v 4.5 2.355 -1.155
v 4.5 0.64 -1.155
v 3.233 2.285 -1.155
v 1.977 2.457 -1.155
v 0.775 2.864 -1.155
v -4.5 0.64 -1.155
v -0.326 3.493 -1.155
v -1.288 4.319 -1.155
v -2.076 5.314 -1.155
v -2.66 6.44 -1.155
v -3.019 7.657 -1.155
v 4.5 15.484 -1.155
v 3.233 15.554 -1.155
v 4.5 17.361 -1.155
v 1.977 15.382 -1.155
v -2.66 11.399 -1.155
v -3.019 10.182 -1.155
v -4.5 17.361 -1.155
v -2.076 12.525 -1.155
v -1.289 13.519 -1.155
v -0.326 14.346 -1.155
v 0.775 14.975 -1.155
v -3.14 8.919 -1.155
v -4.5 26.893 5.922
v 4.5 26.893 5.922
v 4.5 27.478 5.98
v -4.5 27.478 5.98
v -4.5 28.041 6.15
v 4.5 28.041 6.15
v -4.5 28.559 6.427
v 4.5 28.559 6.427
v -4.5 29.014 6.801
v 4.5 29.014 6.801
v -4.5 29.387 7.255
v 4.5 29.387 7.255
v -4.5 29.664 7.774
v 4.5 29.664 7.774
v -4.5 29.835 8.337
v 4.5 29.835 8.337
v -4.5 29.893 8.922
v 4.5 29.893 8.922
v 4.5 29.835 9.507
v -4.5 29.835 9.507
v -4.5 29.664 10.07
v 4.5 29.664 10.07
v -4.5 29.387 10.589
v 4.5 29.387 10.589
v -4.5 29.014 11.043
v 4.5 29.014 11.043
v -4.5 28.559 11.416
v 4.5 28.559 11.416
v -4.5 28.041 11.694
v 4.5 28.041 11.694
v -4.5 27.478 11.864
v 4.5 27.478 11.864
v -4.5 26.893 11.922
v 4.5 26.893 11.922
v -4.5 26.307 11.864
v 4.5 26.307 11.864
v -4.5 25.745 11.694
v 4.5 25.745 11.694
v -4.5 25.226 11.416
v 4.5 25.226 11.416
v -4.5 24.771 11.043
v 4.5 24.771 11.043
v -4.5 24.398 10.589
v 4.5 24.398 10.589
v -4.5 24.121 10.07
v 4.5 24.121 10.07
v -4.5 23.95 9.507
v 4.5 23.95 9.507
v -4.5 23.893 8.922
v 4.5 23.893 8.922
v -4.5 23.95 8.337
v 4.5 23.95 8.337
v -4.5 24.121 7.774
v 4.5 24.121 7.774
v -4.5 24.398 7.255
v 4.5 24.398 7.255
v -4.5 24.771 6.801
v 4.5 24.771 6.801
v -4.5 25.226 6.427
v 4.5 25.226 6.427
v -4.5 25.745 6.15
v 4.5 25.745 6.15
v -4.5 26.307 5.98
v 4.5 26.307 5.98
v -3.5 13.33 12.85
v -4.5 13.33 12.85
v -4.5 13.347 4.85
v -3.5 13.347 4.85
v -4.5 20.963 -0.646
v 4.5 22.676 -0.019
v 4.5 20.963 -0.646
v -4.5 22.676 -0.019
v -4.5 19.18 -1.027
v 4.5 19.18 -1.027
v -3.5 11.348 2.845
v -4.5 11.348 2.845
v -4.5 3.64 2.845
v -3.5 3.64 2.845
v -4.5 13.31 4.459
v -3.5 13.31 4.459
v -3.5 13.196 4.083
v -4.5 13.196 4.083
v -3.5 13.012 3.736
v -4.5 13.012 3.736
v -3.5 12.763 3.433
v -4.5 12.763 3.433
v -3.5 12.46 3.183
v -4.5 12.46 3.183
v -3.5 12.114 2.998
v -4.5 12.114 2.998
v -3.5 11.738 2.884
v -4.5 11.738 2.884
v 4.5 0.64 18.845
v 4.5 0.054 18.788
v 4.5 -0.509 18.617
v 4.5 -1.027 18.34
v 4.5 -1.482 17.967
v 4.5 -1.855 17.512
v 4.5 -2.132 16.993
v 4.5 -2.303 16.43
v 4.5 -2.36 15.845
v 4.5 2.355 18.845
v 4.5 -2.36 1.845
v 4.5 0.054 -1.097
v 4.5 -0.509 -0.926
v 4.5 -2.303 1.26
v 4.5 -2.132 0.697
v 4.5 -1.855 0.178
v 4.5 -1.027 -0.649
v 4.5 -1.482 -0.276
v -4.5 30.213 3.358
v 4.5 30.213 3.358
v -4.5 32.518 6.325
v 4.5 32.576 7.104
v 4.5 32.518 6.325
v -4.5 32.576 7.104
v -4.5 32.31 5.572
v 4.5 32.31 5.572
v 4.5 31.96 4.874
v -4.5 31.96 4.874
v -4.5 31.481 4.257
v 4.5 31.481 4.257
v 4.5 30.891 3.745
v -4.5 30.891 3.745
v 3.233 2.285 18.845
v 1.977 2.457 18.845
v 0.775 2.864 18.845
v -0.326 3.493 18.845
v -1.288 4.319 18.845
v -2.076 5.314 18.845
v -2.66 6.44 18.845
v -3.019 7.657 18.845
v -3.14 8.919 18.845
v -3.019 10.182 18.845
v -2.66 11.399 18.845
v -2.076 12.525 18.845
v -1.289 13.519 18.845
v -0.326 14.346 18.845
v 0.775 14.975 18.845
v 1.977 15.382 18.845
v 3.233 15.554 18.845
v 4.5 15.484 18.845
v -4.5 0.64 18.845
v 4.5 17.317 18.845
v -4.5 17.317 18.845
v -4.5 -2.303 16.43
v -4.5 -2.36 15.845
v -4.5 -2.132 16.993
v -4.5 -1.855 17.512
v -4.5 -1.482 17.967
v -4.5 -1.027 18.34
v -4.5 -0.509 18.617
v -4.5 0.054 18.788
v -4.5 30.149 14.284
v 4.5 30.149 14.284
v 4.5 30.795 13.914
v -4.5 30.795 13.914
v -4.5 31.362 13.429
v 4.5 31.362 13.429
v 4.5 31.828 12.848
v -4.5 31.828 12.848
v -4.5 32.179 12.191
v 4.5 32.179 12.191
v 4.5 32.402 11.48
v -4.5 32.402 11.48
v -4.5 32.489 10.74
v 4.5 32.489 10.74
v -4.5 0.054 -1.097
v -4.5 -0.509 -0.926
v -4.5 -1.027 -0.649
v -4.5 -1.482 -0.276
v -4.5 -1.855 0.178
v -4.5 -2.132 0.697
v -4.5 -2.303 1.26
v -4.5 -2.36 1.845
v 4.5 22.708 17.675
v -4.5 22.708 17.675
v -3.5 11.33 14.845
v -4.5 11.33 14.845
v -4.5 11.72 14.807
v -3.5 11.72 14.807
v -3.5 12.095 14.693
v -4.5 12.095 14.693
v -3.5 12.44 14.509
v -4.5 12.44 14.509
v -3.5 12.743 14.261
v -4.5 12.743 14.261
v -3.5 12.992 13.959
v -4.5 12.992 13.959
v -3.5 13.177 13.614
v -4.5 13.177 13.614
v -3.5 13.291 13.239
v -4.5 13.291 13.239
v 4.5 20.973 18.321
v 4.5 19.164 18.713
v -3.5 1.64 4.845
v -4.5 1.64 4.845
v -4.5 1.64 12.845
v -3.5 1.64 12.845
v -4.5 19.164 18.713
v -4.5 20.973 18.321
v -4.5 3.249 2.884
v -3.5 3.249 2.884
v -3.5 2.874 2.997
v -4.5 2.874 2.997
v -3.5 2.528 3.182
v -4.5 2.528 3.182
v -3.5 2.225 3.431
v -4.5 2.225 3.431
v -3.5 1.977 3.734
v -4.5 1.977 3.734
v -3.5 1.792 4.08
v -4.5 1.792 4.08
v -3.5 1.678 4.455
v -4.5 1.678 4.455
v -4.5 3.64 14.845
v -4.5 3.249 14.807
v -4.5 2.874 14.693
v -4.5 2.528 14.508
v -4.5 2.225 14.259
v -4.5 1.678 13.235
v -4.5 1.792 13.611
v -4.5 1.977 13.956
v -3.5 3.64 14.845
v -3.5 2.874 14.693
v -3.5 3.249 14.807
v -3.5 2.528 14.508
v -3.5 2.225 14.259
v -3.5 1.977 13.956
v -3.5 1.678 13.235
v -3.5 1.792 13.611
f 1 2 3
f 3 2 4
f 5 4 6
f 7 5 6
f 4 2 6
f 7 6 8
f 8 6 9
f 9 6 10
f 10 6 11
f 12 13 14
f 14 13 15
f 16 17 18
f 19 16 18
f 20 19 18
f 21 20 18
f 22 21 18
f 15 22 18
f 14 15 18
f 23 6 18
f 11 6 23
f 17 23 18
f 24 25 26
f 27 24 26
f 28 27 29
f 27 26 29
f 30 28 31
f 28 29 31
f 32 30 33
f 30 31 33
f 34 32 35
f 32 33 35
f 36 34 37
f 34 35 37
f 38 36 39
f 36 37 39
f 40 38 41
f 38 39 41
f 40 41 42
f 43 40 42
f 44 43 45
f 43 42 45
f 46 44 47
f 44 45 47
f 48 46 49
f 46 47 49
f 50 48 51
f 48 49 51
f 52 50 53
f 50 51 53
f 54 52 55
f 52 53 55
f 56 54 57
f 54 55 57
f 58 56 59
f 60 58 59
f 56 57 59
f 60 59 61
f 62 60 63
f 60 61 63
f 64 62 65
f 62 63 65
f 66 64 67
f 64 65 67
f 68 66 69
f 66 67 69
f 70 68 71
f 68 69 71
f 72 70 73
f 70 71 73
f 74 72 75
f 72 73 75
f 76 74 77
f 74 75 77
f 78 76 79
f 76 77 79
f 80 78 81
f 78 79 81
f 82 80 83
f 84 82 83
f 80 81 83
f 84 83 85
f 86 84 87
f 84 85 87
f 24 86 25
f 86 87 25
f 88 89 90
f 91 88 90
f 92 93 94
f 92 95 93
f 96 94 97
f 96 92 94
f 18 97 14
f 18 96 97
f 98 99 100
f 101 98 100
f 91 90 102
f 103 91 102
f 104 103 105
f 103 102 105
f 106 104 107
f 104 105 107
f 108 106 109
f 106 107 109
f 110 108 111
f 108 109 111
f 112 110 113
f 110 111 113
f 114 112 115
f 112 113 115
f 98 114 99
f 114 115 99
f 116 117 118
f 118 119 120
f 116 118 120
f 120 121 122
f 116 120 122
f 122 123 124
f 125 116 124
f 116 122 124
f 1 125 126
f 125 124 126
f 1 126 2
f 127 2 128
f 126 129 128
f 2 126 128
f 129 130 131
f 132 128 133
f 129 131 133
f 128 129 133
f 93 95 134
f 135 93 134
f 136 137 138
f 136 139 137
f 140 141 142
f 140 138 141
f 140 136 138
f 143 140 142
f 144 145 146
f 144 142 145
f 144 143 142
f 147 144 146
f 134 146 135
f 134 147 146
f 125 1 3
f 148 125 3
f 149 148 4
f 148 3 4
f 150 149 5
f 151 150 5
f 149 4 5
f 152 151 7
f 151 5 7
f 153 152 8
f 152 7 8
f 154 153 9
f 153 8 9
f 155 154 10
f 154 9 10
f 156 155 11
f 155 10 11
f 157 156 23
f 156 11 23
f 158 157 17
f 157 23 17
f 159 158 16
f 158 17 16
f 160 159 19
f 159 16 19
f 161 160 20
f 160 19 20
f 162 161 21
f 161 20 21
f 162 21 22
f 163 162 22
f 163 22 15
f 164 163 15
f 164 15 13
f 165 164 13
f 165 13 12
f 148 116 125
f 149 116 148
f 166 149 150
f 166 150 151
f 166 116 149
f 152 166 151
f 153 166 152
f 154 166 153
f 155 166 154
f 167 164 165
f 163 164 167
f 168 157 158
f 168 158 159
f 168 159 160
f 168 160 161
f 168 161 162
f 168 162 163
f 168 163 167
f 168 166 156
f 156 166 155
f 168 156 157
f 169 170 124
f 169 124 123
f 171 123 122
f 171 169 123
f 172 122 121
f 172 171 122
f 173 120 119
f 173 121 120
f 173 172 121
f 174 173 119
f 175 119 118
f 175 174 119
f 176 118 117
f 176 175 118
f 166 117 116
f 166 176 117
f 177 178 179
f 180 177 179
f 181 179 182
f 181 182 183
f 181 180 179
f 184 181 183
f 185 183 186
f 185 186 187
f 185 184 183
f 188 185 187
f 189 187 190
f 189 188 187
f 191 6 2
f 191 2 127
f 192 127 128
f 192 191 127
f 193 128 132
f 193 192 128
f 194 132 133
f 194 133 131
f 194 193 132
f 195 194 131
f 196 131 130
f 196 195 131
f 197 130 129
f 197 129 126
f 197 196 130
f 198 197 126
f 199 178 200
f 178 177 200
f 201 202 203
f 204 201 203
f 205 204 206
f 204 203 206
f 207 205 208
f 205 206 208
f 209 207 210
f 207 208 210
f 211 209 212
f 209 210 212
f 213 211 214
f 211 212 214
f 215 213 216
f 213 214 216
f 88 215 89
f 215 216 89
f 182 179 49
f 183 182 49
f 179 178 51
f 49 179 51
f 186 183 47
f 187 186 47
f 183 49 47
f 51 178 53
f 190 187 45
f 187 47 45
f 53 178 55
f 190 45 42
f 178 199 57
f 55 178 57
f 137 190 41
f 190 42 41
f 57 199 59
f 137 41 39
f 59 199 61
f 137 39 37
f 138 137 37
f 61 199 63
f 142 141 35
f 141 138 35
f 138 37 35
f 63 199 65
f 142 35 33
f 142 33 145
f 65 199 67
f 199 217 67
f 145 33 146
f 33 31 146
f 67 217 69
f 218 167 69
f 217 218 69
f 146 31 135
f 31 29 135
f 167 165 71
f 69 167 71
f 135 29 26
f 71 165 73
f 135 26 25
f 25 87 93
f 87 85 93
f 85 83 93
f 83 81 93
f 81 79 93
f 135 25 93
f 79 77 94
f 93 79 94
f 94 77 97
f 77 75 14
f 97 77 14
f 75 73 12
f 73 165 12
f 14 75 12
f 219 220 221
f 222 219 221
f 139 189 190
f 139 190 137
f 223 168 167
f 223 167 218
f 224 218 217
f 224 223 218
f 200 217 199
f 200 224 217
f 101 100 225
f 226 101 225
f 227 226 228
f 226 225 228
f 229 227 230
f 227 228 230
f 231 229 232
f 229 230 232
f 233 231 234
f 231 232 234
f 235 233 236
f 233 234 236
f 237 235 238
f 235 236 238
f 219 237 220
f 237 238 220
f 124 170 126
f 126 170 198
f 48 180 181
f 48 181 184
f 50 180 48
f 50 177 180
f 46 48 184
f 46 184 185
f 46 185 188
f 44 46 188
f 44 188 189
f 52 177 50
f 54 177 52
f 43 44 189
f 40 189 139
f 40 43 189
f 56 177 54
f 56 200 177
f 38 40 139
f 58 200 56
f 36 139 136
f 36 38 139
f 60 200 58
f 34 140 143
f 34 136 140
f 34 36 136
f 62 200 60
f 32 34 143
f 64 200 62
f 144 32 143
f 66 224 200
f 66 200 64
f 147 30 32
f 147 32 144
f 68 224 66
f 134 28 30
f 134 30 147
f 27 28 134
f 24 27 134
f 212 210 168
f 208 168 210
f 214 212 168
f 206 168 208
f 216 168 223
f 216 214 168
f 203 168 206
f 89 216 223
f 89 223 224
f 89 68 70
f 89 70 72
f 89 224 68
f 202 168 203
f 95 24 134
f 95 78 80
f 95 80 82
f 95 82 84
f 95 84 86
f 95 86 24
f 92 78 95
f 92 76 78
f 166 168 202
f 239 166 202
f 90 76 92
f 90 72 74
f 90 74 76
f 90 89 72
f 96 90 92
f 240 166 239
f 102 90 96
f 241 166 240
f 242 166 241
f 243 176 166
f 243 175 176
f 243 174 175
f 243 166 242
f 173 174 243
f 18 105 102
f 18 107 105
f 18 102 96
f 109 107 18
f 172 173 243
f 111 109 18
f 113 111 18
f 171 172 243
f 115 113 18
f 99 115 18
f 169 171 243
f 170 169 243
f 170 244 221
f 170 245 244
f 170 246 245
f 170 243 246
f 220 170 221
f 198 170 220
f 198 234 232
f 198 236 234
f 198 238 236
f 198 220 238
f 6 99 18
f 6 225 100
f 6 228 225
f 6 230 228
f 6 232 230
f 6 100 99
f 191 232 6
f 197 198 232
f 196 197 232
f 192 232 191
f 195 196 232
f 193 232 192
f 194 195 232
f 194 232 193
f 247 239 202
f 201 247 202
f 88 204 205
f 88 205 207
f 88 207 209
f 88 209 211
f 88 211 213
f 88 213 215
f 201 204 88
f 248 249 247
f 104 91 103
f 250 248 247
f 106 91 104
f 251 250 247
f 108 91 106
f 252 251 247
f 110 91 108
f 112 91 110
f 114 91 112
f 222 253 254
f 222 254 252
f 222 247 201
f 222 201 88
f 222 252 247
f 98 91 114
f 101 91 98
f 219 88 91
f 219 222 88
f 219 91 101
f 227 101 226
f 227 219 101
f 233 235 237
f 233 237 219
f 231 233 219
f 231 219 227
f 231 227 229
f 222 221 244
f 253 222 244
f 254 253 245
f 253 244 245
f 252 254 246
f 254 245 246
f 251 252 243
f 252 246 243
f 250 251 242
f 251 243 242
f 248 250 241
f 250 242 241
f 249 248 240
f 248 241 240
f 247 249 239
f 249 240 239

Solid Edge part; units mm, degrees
sketch "Sketch1" plane through (0, 54.6395, 8.8452) normal (1, 0, 0) x (0, 1, 0)
  line L0 (-54, 10) -> (-37.3222, 10)
  arc A0 (-37.3222, 10) -> (-31.9318, 8.8298) centre (-37.3222, -3) cw
  line L1 (-24.4906, 5.4391) -> (-31.9318, 8.8298)
  arc A1 (-24.4906, 5.4391) -> (-22.1504, 1.8947) centre (-26.1492, 1.7992) cw
  line L2 (-22.1504, 1.8947) -> (-22.0635, -1.7414)
  arc A2 (-24.427, -5.4873) -> (-22.0635, -1.7414) centre (-26.0624, -1.8369) ccw
  line L3 (-31.9639, -8.8638) -> (-24.427, -5.4873)
  arc A3 (-37.2789, -10) -> (-31.9639, -8.8638) centre (-37.2789, 3) ccw
  line L4 (-54, -10) -> (-37.2789, -10)
  arc A4 (-54, -10) -> (-57, -7) centre (-54, -7) cw
  line L5 (-57, 7) -> (-57, -7)
  arc A5 (-54, 10) -> (-57, 7) centre (-54, 7) ccw
extrude "Protrusion1" add sketch "Sketch1" along normal mid plane 9
sketch "Sketch2" plane through (-45.6395, -10, -1.1548) normal (0, 0, -1) x (0, 1, 0)
  arc A0 (25.4838, 50.1395) -> (12.3551, 50.1395) centre (18.9194, 49.1395) cw
  line L0 (12.3551, 50.1395) -> (25.4838, 50.1395)
extrude "Cutout1" cut sketch "Sketch2" against normal up to next and the other way through all
hole "Hole_1" at (4.5, 26.8926, 8.9219) direction (-1, 0, 0) diameter 6 end up to next
sketch "Sketch3" plane through (-4.5, 15.1083, 8.8452) normal (-1, 0, 0) x (0, 1, 0)
  line L0 (-3.7608, 6) -> (-11.4688, 6)
  arc A0 (-11.4688, 6) -> (-13.4688, 4) centre (-11.4688, 4) ccw
  line L1 (-13.4688, 4) -> (-13.4688, -4)
  arc A1 (-13.4688, -4) -> (-11.4688, -6) centre (-11.4688, -4) ccw
  line L2 (-11.4688, -6) -> (-3.7781, -6)
  arc A2 (-3.7781, -6) -> (-1.7781, -4.0043) centre (-3.7781, -4) ccw
  line L3 (-1.7781, -4.0043) -> (-1.7608, 3.9957)
  arc A3 (-3.7608, 6) -> (-1.7608, 3.9957) centre (-3.7608, 4) cw
extrude "ExtrudedCutout_3" cut sketch "Sketch3" against normal blind 1 and the other way blind 11.7703
